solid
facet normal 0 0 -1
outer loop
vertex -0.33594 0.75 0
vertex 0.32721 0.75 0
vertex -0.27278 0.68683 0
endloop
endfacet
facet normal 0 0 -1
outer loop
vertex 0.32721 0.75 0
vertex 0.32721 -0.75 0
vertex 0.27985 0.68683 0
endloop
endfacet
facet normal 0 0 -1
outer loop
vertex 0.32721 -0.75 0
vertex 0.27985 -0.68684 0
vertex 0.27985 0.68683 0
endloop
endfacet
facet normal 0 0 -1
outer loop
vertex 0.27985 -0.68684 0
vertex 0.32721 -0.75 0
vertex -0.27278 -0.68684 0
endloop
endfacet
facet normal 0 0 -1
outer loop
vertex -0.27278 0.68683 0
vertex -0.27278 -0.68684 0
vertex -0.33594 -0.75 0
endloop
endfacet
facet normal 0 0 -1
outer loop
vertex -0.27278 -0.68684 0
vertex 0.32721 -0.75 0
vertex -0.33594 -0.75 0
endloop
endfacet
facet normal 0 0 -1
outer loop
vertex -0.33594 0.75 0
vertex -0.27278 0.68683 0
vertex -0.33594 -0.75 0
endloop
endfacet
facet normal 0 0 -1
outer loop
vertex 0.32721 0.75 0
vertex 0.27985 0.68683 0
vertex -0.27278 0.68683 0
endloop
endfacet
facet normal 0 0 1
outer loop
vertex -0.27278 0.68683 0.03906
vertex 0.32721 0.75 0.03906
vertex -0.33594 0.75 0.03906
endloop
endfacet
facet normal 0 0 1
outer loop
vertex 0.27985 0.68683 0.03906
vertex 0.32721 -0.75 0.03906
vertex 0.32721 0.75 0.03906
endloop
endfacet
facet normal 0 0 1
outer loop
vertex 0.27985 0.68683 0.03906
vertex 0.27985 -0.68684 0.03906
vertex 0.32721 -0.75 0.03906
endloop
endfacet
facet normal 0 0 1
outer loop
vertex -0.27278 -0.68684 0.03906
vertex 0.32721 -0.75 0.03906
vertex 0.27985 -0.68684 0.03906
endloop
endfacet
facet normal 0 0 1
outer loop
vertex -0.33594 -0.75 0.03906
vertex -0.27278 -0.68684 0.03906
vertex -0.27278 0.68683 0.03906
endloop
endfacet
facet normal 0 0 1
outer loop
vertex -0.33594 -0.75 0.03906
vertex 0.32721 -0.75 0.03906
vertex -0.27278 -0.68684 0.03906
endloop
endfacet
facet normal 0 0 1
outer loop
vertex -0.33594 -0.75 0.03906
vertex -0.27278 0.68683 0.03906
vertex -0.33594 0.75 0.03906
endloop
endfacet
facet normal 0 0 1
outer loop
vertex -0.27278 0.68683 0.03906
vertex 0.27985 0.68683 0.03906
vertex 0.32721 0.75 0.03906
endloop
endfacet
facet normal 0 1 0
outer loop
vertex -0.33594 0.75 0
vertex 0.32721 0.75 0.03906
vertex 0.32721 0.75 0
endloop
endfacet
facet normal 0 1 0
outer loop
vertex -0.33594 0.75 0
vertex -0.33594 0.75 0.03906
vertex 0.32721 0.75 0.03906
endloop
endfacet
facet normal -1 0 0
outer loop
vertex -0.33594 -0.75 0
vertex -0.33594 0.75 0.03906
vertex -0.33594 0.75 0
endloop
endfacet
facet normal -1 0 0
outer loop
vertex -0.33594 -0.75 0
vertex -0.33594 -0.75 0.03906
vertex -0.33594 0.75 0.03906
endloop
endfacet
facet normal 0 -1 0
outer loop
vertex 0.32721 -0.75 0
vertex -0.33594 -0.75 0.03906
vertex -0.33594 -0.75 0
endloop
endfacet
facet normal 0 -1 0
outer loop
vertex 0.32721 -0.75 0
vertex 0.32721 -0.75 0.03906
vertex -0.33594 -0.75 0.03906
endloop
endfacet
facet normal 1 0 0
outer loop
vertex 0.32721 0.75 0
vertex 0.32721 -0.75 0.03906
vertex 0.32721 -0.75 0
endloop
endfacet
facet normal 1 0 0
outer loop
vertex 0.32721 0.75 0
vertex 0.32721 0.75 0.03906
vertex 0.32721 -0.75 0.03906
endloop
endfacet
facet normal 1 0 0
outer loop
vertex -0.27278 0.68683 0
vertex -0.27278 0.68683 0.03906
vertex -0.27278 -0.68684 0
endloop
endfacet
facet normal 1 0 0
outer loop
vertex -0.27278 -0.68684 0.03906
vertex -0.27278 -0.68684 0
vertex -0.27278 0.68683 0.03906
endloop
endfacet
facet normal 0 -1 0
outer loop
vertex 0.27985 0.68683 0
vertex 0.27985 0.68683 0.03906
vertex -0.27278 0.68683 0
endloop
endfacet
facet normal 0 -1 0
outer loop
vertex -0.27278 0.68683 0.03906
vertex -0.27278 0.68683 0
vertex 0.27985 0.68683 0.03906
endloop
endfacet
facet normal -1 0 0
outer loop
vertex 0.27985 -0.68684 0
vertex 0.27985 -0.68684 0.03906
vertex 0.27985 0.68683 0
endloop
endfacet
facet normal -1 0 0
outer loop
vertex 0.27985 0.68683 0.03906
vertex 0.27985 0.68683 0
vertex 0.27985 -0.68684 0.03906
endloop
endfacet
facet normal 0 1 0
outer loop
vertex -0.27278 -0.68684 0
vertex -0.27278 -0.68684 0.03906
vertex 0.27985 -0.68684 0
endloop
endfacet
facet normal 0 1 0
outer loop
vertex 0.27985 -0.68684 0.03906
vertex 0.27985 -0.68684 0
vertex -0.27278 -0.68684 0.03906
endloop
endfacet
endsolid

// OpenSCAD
EPS = 0.01;

translate([-0.3359375, -0.75, 0.0])
linear_extrude(height=0.0390625)
difference() {
    polygon(points=[[0.6631578947368422, 0.0], [0.6631578947368422, 1.5], [0.0, 1.5], [0.0, 0.0]]);
    translate([0, 0, EPS])
    polygon(points=[[0.6157894736842106, 0.06315789473684211], [0.6157894736842106, 1.436842105263158], [0.06315789473684211, 1.436842105263158], [0.06315789473684211, 0.06315789473684211]]);
}
